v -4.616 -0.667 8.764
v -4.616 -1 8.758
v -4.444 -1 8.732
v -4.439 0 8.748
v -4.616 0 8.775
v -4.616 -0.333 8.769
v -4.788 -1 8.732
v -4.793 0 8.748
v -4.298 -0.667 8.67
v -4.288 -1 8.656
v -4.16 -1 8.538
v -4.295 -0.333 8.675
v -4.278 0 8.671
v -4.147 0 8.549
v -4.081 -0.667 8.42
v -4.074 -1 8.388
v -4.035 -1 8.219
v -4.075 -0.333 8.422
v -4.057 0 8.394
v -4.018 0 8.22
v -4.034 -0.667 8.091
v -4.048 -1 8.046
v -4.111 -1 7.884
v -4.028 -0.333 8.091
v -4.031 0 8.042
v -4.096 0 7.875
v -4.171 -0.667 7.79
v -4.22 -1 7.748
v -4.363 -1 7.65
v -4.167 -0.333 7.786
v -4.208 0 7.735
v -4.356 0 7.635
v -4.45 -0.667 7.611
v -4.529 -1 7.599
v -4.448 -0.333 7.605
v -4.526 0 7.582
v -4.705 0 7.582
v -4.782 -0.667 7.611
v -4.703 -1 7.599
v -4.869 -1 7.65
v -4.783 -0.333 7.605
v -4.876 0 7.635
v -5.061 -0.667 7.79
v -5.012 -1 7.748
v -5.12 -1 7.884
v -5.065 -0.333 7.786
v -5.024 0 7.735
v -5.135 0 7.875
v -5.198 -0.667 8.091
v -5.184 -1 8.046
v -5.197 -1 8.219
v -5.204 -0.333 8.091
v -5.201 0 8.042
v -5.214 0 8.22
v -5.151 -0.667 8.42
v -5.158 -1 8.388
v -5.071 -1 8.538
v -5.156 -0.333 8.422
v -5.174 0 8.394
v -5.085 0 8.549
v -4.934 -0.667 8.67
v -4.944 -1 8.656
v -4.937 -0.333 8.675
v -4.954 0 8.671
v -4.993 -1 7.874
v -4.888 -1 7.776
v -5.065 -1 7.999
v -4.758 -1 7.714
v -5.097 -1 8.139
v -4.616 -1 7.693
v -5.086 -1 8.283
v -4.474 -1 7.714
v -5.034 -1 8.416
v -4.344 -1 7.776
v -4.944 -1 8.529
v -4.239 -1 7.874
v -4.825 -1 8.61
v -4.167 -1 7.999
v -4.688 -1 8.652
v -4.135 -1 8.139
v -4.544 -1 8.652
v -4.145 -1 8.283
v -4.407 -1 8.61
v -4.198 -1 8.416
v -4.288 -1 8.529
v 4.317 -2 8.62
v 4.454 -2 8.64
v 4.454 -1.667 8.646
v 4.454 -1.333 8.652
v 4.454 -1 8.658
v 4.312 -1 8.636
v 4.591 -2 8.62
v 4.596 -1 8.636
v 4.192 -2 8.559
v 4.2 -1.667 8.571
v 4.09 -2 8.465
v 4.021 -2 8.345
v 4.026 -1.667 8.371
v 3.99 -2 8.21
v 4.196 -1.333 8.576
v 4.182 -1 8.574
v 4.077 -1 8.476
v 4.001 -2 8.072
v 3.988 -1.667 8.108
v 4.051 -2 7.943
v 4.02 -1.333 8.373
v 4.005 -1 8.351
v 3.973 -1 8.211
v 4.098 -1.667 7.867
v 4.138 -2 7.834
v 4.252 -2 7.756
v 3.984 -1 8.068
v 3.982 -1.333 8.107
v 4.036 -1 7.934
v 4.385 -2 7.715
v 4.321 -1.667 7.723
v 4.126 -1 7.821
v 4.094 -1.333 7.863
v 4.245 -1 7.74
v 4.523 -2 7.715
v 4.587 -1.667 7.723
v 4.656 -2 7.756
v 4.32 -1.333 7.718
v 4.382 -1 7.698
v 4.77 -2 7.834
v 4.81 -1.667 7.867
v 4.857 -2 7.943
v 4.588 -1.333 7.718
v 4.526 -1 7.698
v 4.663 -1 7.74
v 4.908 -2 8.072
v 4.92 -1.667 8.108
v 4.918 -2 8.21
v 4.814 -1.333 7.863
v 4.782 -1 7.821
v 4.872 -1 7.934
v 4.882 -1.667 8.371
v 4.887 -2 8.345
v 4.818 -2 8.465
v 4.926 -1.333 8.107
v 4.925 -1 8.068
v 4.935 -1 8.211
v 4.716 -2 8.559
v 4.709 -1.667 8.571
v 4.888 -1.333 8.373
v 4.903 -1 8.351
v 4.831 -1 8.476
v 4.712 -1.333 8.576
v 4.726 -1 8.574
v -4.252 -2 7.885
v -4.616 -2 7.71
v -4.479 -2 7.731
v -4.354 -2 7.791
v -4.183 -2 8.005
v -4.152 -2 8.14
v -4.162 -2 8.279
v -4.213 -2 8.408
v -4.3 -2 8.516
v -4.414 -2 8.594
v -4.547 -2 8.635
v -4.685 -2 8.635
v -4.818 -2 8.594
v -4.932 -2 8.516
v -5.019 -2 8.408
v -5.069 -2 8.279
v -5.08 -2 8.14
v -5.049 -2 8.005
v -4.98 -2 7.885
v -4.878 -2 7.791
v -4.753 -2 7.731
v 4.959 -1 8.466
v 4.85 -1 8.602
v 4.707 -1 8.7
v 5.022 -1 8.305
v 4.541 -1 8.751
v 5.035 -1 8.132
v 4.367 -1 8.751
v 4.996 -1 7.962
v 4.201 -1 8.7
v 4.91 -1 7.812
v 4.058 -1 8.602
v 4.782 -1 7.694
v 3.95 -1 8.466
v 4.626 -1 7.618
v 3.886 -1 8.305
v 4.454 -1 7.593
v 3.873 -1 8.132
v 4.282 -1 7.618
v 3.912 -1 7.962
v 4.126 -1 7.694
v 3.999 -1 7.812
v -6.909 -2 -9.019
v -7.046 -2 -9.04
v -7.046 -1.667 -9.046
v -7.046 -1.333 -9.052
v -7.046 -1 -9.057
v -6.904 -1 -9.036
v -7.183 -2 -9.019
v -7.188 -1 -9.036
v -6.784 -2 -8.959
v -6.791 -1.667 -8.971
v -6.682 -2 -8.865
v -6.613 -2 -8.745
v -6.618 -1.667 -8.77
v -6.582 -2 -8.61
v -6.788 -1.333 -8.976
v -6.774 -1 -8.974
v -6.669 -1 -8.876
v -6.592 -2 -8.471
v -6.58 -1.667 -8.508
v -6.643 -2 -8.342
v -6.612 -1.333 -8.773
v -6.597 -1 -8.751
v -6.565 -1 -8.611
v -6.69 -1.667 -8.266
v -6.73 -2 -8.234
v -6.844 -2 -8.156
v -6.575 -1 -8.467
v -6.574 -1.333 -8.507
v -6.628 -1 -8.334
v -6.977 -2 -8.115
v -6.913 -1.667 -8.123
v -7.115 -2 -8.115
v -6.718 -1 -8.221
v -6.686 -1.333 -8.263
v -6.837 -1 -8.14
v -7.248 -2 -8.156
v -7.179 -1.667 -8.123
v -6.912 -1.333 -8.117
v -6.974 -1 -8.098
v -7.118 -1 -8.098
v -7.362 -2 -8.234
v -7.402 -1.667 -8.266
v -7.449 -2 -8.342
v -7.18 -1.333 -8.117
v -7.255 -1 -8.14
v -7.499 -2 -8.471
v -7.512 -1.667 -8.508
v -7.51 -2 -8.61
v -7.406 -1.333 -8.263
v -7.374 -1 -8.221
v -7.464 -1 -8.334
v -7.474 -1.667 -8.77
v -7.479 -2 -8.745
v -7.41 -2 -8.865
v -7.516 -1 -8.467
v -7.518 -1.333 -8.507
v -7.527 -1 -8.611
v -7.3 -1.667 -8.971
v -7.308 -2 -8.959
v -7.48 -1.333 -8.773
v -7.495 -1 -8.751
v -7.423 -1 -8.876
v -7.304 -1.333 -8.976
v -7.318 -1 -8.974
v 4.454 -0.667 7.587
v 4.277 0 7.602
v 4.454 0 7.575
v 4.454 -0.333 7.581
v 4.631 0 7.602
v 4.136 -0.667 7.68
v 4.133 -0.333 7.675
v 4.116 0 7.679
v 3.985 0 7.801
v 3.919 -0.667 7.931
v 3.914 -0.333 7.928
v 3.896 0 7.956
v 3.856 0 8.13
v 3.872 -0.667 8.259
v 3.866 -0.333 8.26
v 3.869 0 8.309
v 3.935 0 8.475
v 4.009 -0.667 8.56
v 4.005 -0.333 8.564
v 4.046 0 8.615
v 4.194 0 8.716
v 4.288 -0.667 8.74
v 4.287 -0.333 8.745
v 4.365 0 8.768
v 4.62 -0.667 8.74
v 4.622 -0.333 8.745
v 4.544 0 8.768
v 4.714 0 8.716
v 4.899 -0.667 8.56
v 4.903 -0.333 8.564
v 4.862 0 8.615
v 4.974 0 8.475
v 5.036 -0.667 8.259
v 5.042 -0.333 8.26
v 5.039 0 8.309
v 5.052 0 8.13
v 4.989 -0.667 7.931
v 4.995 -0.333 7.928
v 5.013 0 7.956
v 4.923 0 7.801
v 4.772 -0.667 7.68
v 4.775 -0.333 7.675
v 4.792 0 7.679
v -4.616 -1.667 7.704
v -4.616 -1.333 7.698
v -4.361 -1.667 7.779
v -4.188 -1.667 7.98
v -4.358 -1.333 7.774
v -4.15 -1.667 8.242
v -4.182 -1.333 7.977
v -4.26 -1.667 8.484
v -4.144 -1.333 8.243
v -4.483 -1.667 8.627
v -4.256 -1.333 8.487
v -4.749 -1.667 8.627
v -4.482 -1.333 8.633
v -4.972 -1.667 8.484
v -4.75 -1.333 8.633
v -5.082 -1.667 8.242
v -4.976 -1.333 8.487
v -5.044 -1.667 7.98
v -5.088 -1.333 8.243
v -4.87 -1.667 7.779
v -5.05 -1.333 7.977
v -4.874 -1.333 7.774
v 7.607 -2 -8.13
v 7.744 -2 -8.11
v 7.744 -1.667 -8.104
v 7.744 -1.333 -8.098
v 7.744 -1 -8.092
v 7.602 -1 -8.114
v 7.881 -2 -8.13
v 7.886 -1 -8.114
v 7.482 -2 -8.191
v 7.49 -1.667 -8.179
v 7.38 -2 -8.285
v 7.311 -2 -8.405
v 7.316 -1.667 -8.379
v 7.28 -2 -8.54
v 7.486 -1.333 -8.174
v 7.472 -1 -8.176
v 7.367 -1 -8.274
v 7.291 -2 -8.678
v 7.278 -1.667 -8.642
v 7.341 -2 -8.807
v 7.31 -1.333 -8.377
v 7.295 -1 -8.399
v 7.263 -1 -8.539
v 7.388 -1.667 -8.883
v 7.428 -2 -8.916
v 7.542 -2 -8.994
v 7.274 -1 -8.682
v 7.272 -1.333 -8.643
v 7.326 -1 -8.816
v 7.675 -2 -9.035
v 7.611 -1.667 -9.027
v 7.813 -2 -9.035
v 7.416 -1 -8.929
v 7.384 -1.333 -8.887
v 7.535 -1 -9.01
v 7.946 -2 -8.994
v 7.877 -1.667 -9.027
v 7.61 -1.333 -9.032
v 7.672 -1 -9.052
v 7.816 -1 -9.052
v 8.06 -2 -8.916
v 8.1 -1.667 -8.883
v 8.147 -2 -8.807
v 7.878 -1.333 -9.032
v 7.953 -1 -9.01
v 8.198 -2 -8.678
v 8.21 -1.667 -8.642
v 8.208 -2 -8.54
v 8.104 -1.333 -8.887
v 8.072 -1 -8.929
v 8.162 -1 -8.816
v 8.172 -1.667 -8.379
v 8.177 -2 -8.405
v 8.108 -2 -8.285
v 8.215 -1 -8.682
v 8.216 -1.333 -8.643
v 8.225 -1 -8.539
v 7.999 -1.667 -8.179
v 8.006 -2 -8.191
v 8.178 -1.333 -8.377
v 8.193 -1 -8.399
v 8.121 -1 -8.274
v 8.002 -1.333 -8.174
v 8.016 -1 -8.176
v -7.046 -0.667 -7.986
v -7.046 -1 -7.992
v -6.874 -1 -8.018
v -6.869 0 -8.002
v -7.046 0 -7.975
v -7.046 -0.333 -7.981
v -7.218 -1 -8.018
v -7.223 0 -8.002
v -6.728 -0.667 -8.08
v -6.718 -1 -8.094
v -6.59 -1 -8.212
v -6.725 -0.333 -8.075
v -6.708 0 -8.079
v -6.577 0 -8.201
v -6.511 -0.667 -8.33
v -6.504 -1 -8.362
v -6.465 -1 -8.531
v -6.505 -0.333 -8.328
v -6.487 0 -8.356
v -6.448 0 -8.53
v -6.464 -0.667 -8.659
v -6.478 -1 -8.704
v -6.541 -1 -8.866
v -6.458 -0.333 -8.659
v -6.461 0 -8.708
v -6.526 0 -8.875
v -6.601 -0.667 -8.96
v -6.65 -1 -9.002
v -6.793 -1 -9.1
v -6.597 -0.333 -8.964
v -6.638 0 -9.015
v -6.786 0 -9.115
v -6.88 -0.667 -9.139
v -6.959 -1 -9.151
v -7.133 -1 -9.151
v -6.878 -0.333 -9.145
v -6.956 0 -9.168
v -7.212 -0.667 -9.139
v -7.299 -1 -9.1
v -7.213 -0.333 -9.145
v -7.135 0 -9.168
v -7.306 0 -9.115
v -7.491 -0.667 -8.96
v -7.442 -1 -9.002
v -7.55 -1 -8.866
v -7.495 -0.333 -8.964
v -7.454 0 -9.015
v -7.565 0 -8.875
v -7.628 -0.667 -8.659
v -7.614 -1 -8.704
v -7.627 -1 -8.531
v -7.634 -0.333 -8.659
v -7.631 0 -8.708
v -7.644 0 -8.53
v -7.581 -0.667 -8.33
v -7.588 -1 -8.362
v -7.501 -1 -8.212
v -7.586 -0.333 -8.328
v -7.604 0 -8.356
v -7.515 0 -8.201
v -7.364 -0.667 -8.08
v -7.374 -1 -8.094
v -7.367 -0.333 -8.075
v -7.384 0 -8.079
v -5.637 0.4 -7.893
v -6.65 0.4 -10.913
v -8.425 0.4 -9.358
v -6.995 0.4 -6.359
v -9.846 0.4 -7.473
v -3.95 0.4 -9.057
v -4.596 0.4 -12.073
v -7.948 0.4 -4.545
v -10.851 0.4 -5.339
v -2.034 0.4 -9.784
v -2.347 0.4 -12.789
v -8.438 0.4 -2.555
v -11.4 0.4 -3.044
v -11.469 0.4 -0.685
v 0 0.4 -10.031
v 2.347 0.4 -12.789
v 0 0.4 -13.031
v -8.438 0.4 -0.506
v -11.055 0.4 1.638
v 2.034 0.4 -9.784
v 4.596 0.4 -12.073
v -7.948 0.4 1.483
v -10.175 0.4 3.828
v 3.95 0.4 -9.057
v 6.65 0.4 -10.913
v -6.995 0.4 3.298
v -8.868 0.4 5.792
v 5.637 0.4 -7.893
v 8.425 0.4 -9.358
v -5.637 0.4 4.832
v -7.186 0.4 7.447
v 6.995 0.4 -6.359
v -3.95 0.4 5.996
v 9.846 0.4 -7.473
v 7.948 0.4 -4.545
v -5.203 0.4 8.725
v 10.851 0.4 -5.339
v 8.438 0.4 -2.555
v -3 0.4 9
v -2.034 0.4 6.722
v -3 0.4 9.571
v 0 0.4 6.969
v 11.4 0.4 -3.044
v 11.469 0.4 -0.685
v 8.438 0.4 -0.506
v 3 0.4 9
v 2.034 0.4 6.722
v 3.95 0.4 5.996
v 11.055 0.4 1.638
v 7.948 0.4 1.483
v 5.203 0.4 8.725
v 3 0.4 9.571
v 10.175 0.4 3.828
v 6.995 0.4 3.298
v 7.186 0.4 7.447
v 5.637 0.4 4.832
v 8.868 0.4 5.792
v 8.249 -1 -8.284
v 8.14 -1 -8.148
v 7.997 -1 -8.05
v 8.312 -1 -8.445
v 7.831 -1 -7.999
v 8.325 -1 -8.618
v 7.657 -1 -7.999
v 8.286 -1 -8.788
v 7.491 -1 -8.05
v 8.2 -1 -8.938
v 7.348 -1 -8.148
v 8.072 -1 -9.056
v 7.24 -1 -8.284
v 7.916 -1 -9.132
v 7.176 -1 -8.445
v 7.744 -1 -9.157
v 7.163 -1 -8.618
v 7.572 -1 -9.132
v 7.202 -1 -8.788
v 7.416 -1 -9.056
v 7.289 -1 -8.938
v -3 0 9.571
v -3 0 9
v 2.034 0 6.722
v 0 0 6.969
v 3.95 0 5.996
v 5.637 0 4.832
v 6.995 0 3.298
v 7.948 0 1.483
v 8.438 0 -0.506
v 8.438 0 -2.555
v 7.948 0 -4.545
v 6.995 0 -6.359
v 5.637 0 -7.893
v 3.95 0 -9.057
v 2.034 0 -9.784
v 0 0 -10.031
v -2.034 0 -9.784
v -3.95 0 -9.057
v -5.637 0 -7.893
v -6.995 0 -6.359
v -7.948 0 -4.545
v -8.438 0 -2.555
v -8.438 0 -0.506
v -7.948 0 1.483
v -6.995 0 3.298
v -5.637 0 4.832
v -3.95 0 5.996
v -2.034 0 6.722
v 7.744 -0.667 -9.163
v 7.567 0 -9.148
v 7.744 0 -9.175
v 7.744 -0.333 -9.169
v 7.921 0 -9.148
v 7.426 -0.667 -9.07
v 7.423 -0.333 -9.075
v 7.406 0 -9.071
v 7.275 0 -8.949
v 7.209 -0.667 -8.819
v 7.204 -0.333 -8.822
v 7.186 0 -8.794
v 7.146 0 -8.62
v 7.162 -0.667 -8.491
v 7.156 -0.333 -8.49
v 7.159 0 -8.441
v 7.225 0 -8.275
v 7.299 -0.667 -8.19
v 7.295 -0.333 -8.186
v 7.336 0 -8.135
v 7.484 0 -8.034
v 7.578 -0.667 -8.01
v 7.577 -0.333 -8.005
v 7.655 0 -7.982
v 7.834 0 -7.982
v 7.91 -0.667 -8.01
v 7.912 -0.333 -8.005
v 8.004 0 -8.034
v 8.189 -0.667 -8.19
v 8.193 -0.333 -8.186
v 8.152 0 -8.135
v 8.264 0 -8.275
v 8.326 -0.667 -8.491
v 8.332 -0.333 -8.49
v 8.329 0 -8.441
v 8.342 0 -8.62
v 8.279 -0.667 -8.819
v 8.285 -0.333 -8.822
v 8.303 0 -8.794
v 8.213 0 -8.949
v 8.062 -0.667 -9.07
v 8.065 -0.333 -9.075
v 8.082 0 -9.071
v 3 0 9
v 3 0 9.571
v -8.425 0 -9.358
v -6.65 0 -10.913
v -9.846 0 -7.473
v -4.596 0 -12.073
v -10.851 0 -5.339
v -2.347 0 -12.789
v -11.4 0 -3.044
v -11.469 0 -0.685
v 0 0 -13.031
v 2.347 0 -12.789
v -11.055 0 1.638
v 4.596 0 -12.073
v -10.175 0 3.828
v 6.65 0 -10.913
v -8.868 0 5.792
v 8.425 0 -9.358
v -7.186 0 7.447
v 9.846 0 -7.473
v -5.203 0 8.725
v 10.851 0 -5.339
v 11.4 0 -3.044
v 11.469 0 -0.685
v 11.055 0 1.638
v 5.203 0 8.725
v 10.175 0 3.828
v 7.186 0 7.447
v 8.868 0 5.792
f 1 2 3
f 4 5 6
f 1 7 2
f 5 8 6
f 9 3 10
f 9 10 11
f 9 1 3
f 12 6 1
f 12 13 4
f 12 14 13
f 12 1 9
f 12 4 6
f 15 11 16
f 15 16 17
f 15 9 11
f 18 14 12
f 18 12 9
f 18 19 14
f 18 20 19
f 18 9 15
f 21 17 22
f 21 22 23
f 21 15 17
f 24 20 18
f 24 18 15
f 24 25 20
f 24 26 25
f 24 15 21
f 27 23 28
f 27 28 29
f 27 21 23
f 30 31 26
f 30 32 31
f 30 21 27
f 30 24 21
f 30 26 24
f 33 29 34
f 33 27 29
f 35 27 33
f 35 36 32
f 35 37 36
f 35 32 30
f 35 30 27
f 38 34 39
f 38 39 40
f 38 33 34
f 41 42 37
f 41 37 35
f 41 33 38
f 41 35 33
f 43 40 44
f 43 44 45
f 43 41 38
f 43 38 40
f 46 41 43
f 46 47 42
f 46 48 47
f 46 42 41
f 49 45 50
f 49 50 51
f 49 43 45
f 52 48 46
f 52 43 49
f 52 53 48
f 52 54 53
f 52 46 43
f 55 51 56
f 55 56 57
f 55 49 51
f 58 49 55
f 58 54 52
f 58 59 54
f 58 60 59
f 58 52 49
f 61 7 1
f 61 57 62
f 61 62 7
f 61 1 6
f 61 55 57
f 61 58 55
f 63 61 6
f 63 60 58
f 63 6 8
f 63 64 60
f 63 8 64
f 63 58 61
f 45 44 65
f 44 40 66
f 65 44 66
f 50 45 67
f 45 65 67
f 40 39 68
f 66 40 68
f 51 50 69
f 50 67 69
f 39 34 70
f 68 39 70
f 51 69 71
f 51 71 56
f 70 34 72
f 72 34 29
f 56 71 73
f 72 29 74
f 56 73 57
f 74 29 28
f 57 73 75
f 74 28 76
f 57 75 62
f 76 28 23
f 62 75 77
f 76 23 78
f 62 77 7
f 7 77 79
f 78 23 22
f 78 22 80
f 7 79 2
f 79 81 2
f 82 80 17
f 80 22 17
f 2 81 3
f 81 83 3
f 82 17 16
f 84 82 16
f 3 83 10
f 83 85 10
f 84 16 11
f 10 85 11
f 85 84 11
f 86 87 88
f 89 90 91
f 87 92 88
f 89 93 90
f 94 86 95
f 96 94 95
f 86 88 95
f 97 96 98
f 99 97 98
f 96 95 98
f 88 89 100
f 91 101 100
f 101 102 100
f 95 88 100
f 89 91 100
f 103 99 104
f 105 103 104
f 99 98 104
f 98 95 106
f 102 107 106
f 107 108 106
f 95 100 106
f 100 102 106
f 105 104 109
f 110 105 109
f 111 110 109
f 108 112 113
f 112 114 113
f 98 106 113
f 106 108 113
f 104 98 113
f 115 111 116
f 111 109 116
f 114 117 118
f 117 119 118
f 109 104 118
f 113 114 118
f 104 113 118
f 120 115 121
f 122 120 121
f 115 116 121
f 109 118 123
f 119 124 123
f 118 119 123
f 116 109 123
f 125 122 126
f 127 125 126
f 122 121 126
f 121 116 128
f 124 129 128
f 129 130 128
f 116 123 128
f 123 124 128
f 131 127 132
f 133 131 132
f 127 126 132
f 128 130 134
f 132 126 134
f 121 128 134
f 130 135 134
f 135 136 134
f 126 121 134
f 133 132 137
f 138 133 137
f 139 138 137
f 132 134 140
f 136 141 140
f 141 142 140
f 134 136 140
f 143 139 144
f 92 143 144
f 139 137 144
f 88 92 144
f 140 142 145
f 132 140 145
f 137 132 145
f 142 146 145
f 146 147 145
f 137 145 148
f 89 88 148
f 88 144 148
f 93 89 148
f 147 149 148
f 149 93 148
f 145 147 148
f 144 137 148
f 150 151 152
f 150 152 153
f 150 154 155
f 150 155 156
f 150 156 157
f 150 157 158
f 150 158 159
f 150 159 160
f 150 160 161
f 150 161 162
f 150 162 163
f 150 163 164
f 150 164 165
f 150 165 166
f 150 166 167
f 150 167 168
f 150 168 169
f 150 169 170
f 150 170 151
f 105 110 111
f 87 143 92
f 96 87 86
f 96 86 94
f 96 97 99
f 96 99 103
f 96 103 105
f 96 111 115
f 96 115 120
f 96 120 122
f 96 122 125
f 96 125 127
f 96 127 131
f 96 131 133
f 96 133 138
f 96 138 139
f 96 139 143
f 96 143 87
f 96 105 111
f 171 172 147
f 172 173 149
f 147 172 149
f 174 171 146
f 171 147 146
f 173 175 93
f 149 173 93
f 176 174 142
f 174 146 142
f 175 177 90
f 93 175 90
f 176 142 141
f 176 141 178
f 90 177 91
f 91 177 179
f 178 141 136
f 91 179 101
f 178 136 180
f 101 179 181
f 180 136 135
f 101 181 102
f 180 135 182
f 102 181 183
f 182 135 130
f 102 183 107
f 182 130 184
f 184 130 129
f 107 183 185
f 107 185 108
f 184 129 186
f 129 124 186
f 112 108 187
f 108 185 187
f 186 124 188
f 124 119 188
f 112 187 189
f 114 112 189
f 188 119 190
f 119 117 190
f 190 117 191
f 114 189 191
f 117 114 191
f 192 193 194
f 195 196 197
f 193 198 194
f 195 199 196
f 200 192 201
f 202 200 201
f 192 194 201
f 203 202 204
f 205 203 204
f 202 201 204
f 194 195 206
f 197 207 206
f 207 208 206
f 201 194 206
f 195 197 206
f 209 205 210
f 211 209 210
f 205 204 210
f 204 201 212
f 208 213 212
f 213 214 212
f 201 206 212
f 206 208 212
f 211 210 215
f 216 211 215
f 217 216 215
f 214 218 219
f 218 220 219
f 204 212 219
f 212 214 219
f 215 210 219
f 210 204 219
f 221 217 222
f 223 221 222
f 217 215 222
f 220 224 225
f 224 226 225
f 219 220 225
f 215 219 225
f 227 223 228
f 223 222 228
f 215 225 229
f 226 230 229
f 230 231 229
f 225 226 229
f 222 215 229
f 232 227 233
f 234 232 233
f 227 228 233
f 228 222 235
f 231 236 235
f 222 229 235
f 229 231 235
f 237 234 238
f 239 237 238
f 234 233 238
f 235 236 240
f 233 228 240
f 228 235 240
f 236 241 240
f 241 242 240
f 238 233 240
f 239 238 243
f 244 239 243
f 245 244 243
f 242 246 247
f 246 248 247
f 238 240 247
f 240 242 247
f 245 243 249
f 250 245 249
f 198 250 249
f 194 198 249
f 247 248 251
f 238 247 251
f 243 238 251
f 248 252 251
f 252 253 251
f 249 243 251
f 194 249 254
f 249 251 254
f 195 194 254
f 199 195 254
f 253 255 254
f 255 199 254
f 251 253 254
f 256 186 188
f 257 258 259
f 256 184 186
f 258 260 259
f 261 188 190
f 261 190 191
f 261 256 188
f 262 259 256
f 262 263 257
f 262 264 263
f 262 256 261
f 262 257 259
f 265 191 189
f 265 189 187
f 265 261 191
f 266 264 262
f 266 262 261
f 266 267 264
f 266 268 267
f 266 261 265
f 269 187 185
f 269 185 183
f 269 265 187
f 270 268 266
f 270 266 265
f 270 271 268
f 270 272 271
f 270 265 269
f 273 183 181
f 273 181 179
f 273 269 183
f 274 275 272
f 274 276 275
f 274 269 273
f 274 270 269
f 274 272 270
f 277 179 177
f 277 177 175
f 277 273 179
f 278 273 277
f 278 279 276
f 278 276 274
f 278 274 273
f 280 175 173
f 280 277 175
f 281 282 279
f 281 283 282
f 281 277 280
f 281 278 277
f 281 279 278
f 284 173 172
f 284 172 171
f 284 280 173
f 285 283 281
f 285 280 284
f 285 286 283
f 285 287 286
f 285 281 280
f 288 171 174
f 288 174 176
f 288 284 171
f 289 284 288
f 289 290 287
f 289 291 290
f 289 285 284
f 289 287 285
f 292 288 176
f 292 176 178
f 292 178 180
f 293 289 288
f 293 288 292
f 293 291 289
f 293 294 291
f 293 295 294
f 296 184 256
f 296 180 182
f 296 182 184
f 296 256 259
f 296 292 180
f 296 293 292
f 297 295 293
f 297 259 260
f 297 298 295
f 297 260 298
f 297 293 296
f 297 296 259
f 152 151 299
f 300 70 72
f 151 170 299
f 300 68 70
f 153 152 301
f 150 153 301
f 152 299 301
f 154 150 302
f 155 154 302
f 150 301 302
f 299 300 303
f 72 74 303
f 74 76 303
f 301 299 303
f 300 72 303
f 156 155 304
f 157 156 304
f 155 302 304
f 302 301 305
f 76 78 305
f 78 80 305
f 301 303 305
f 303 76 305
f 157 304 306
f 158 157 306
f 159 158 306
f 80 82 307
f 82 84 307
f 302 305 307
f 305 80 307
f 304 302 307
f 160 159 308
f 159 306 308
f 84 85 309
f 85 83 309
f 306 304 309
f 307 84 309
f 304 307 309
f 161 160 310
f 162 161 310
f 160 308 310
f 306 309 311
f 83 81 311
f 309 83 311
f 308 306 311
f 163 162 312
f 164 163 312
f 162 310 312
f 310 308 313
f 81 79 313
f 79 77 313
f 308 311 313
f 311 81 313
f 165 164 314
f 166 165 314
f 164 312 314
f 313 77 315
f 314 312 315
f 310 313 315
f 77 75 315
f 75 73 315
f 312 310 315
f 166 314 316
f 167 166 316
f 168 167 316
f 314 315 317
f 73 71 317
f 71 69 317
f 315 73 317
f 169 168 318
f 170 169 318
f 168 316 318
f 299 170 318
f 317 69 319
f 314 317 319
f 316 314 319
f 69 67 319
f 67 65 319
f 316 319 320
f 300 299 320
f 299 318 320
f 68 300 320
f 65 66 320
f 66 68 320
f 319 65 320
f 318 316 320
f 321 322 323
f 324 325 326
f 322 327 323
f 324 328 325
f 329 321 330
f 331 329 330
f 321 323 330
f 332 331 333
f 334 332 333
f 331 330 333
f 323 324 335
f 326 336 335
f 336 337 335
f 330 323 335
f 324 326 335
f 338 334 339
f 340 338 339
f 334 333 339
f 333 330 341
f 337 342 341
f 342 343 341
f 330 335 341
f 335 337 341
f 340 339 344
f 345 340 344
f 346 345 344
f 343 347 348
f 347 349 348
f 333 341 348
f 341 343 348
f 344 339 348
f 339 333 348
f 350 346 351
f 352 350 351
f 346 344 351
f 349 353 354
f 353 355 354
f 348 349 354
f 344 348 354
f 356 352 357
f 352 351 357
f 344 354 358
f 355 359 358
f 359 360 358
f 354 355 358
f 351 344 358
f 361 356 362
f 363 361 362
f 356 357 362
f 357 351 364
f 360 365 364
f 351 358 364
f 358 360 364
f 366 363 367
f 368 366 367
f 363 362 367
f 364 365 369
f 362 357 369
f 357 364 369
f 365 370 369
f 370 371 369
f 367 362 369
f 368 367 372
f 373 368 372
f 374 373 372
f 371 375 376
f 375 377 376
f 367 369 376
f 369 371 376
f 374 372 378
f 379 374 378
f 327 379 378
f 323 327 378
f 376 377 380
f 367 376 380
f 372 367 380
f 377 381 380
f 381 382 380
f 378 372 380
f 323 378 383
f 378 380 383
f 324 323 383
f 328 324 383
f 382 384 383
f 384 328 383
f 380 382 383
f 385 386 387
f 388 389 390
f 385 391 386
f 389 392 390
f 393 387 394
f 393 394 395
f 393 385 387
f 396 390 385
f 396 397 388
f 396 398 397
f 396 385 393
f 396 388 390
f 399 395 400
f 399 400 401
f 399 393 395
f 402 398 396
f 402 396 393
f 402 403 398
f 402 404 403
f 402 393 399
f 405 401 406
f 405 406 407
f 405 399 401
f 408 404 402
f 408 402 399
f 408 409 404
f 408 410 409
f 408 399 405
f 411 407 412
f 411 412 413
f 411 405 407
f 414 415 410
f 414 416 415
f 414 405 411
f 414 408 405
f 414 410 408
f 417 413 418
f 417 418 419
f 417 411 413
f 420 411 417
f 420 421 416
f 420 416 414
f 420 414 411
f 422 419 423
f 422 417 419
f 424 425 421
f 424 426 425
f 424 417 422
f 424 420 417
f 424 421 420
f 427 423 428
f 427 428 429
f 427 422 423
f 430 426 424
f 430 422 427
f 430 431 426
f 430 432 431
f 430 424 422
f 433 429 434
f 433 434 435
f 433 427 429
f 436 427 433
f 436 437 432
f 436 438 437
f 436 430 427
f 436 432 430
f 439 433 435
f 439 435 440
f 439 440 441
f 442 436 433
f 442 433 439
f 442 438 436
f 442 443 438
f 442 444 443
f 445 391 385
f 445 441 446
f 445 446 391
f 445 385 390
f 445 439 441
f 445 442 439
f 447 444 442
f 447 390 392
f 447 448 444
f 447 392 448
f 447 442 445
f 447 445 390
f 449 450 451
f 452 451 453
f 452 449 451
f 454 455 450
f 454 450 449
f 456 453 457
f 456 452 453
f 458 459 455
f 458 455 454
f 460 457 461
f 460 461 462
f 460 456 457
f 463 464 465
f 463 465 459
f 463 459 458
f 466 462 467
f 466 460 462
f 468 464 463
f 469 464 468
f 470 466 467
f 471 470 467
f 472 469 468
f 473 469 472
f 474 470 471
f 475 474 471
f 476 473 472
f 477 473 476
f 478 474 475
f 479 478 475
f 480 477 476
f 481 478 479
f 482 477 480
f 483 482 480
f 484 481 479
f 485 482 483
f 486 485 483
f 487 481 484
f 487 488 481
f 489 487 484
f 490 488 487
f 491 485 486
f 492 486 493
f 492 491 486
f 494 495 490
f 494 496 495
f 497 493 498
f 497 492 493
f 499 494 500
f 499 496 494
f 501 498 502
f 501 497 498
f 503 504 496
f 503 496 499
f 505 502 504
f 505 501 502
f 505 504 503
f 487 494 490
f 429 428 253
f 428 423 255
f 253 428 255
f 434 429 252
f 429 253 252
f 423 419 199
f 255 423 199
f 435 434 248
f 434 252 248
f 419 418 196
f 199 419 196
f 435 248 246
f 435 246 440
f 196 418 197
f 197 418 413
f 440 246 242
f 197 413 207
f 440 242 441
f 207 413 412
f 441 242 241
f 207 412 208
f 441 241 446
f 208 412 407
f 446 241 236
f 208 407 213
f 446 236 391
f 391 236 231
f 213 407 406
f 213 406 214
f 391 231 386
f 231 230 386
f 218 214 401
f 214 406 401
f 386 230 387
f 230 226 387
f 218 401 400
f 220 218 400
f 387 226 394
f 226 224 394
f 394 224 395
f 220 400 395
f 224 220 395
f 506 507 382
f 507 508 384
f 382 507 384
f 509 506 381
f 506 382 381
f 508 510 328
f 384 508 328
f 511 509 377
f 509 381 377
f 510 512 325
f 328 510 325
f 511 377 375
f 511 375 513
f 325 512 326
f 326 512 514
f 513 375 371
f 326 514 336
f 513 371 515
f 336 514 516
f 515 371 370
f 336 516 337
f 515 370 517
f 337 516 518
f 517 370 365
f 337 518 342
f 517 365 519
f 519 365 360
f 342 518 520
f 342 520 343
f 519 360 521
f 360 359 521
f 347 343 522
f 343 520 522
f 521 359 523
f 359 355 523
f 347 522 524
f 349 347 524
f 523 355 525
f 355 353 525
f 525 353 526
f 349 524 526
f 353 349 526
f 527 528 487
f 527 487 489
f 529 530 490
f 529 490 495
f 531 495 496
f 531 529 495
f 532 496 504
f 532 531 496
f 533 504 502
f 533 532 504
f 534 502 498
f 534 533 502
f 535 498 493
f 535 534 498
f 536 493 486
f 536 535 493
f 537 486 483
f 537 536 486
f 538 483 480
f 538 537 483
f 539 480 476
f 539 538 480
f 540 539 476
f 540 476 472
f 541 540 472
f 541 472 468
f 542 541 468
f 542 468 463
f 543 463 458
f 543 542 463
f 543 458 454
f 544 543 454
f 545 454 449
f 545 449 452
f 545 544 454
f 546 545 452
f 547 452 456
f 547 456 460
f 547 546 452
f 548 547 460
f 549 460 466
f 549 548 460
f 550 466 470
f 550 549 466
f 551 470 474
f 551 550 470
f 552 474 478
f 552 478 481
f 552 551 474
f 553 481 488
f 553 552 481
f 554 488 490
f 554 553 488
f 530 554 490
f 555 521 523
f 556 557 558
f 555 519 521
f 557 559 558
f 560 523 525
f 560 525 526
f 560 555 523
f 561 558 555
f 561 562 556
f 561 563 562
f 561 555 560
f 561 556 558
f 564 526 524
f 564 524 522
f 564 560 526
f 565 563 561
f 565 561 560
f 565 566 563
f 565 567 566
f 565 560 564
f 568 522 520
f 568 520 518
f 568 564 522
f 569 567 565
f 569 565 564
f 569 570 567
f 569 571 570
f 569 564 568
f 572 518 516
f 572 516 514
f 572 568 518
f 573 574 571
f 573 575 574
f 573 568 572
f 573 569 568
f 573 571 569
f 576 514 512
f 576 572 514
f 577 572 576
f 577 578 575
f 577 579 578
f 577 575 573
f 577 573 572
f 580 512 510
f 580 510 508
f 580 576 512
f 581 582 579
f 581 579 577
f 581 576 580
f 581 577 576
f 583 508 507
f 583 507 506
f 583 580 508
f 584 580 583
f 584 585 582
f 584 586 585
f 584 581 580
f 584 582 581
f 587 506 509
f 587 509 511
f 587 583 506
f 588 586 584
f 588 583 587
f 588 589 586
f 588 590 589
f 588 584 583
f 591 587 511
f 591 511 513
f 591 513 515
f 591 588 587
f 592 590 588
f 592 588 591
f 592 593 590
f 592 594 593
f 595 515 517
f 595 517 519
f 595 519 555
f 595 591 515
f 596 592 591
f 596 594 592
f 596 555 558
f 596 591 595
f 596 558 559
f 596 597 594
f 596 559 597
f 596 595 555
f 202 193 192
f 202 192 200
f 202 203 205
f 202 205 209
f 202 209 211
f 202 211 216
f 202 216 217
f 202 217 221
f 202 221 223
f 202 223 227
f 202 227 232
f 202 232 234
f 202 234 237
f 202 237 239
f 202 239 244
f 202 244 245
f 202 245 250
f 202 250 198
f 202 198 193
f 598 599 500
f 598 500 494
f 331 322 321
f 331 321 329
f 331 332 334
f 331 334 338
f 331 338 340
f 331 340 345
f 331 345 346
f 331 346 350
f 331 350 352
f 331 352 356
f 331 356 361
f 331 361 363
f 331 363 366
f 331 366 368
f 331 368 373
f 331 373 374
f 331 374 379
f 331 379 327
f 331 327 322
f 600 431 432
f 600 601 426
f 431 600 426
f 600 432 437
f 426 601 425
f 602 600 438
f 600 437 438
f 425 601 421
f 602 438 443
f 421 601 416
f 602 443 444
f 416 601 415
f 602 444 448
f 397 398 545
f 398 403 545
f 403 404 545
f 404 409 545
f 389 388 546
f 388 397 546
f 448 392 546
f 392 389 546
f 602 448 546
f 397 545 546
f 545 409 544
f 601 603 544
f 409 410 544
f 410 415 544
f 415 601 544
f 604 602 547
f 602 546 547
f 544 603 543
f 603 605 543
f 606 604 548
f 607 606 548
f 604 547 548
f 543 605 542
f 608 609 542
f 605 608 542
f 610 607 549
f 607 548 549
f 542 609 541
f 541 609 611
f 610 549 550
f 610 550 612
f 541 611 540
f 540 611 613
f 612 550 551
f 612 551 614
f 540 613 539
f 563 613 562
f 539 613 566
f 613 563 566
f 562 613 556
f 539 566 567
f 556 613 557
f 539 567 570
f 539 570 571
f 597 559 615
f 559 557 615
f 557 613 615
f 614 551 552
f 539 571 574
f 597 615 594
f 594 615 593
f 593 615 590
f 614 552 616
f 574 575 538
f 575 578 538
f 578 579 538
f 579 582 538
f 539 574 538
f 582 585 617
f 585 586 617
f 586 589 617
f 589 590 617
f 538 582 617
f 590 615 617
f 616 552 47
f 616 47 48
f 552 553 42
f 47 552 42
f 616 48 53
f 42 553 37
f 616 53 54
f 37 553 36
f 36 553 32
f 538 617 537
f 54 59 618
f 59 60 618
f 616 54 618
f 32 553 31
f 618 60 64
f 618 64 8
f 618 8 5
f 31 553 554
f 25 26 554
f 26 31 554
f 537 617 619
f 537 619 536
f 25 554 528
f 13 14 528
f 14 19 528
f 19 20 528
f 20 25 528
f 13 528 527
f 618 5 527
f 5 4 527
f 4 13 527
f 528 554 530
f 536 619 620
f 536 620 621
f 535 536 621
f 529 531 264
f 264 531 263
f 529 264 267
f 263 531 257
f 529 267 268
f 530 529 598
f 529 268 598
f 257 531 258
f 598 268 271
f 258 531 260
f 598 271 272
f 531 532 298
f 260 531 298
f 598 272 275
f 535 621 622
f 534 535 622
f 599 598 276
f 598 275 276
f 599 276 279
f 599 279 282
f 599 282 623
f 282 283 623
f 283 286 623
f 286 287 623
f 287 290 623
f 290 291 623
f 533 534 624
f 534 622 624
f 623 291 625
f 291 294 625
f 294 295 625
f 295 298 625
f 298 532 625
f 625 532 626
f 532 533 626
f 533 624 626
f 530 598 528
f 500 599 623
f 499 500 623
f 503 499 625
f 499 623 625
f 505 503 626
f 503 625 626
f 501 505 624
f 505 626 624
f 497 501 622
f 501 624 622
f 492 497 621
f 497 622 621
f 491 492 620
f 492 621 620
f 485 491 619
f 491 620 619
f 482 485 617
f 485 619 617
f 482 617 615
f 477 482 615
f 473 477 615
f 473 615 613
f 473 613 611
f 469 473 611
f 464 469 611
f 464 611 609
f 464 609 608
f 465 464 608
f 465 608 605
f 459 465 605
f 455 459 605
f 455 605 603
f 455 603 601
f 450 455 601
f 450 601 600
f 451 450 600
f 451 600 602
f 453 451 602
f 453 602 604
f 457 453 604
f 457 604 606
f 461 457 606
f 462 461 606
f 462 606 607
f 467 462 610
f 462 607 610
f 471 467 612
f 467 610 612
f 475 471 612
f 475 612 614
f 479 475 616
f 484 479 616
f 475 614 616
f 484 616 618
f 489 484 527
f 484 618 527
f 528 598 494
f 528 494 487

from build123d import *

# Parameters (mm, degrees)
SKETCH1_R           = 11.5
SKETCH1_R_2         = 8.5
BOSS_EXTRUDE1_DEPTH = 0.4
SKETCH2_R           = 0.6
BOSS_EXTRUDE2_DEPTH = 1
SKETCH3_R           = 0.5
BOSS_EXTRUDE3_DEPTH = 1
CUT_EXTRUDE1_START  = -0.4
CUT_EXTRUDE1_DEPTH  = 0.4
DRAFT2_ANGLE        = -1


with BuildPart() as part:
    # Sketch1 → Boss-Extrude1 (new body)
    with BuildSketch(Plane(origin=(0, 0, 0), x_dir=(1, 0, 0), z_dir=(0, 1, 0))):
        with Locations(Location((0, 1.53064501, 0), (0, 0, 270))):
            Circle(SKETCH1_R)
        with Locations(Location((0, 1.53064501, 0), (0, 0, 270))):
            Circle(SKETCH1_R_2, mode=Mode.SUBTRACT)
    extrude(amount=BOSS_EXTRUDE1_DEPTH)

    # Sketch2 → Boss-Extrude2 (add)
    with BuildSketch(Plane(origin=(0, 0, 0), x_dir=(1, 0, 0), z_dir=(0, 1, 0))):
        with Locations(Location((-4.61588, -8.175151, 0), (0, 0, 270))):
            Circle(SKETCH2_R)
        with Locations(Location((-7.04588, 8.574849, 0), (0, 0, 270))):
            Circle(SKETCH2_R)
        with Locations(Location((7.74412, 8.574849, 0), (0, 0, 90))):
            Circle(SKETCH2_R)
        with Locations(Location((4.45412, -8.175151, 0), (0, 0, 90))):
            Circle(SKETCH2_R)
    extrude(amount=-BOSS_EXTRUDE2_DEPTH)

    # Sketch3 → Boss-Extrude3 (add)
    with BuildSketch(Plane.XZ.offset(1)):
        with Locations(Location((-4.61588, 8.175151, 0), (0, 0, 270))):
            Circle(SKETCH3_R)
        with Locations(Location((-7.04588, -8.574849, 0), (0, 0, 270))):
            Circle(SKETCH3_R)
        with Locations(Location((7.74412, -8.574849, 0), (0, 0, 90))):
            Circle(SKETCH3_R)
        with Locations(Location((4.45412, 8.175151, 0), (0, 0, 90))):
            Circle(SKETCH3_R)
    extrude(amount=BOSS_EXTRUDE3_DEPTH)

    # Sketch6 → Cut-Extrude1 (cut)
    with BuildSketch(Plane(origin=(0, 0.4, 0), x_dir=(1, 0, 0), z_dir=(0, 1, 0)).offset(CUT_EXTRUDE1_START)):
        with BuildLine():
            Line((3, -9), (-3, -9))
            Line((-3, -9), (-3, -9.571156646))
            ThreePointArc((-3, -9.571156646), (0, -9.96935499), (3, -9.571156646))
            Line((3, -9.571156646), (3, -9))
        make_face()
    extrude(amount=CUT_EXTRUDE1_DEPTH, mode=Mode.SUBTRACT)

    # Draft2
    draft2_faces = [part.faces().sort_by_distance(p)[0] for p in [
        (7.74412, -1.5, -9.074849),
        (7.74412, -0.5, -7.974849),
        (4.45412, -0.5, 8.775151),
        (4.45412, -1.5, 7.675151),
        (-4.61588, -1.5, 8.675151),
        (-4.61588, -0.5, 7.575151),
        (-7.04588, -0.5, -9.174849),
        (-7.04588, -1.5, -8.074849),
    ]]
    draft(draft2_faces, Plane.ZX, DRAFT2_ANGLE)


solid = part.part
